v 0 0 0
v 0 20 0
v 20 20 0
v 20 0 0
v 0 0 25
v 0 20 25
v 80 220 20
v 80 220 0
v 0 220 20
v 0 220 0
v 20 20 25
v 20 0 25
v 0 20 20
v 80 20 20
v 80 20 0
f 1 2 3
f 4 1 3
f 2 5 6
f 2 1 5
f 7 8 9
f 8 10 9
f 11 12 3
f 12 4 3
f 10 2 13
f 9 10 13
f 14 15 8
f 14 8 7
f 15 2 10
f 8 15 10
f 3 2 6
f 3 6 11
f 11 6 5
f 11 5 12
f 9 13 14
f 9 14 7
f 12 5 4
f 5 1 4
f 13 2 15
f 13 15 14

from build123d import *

# Parameters (mm, degrees)
F0_W     = 20
F0_H     = 20
F1_DEPTH = 20
F2_DEPTH = 200
F3_DEPTH = 5
F4_DEPTH = 20
F5_DEPTH = 40


with BuildPart() as f1:
    # F0 (on Top) → F1 (new body)
    with BuildSketch(Plane.XY):
        with Locations((10, 10)):
            Rectangle(F0_W, F0_H)
    extrude(amount=F1_DEPTH)


with BuildPart() as f2:
    # F2 (new): a face of the model
    f2_faces = [f1.part.faces().sort_by_distance(p)[0] for p in [
        (10, 20, 10),
    ]]
    extrude(f2_faces, amount=F2_DEPTH)

    # F4 (add): a face of the model
    f4_faces = [f2.faces().sort_by_distance(p)[0] for p in [
        (20, 120, 10),
    ]]
    extrude(f4_faces, amount=F4_DEPTH)

    # F5 (add): a face of the model
    f5_faces = [f2.faces().sort_by_distance(p)[0] for p in [
        (40, 120, 10),
    ]]
    extrude(f5_faces, amount=F5_DEPTH)


with BuildPart() as f1_1:
    add(f1.part)

    # F3 (add): a face of the model
    f3_faces = [f1_1.faces().sort_by_distance(p)[0] for p in [
        (10, 10, 20),
    ]]
    extrude(f3_faces, amount=F3_DEPTH)


solid = Compound([f2.part, f1_1.part])
